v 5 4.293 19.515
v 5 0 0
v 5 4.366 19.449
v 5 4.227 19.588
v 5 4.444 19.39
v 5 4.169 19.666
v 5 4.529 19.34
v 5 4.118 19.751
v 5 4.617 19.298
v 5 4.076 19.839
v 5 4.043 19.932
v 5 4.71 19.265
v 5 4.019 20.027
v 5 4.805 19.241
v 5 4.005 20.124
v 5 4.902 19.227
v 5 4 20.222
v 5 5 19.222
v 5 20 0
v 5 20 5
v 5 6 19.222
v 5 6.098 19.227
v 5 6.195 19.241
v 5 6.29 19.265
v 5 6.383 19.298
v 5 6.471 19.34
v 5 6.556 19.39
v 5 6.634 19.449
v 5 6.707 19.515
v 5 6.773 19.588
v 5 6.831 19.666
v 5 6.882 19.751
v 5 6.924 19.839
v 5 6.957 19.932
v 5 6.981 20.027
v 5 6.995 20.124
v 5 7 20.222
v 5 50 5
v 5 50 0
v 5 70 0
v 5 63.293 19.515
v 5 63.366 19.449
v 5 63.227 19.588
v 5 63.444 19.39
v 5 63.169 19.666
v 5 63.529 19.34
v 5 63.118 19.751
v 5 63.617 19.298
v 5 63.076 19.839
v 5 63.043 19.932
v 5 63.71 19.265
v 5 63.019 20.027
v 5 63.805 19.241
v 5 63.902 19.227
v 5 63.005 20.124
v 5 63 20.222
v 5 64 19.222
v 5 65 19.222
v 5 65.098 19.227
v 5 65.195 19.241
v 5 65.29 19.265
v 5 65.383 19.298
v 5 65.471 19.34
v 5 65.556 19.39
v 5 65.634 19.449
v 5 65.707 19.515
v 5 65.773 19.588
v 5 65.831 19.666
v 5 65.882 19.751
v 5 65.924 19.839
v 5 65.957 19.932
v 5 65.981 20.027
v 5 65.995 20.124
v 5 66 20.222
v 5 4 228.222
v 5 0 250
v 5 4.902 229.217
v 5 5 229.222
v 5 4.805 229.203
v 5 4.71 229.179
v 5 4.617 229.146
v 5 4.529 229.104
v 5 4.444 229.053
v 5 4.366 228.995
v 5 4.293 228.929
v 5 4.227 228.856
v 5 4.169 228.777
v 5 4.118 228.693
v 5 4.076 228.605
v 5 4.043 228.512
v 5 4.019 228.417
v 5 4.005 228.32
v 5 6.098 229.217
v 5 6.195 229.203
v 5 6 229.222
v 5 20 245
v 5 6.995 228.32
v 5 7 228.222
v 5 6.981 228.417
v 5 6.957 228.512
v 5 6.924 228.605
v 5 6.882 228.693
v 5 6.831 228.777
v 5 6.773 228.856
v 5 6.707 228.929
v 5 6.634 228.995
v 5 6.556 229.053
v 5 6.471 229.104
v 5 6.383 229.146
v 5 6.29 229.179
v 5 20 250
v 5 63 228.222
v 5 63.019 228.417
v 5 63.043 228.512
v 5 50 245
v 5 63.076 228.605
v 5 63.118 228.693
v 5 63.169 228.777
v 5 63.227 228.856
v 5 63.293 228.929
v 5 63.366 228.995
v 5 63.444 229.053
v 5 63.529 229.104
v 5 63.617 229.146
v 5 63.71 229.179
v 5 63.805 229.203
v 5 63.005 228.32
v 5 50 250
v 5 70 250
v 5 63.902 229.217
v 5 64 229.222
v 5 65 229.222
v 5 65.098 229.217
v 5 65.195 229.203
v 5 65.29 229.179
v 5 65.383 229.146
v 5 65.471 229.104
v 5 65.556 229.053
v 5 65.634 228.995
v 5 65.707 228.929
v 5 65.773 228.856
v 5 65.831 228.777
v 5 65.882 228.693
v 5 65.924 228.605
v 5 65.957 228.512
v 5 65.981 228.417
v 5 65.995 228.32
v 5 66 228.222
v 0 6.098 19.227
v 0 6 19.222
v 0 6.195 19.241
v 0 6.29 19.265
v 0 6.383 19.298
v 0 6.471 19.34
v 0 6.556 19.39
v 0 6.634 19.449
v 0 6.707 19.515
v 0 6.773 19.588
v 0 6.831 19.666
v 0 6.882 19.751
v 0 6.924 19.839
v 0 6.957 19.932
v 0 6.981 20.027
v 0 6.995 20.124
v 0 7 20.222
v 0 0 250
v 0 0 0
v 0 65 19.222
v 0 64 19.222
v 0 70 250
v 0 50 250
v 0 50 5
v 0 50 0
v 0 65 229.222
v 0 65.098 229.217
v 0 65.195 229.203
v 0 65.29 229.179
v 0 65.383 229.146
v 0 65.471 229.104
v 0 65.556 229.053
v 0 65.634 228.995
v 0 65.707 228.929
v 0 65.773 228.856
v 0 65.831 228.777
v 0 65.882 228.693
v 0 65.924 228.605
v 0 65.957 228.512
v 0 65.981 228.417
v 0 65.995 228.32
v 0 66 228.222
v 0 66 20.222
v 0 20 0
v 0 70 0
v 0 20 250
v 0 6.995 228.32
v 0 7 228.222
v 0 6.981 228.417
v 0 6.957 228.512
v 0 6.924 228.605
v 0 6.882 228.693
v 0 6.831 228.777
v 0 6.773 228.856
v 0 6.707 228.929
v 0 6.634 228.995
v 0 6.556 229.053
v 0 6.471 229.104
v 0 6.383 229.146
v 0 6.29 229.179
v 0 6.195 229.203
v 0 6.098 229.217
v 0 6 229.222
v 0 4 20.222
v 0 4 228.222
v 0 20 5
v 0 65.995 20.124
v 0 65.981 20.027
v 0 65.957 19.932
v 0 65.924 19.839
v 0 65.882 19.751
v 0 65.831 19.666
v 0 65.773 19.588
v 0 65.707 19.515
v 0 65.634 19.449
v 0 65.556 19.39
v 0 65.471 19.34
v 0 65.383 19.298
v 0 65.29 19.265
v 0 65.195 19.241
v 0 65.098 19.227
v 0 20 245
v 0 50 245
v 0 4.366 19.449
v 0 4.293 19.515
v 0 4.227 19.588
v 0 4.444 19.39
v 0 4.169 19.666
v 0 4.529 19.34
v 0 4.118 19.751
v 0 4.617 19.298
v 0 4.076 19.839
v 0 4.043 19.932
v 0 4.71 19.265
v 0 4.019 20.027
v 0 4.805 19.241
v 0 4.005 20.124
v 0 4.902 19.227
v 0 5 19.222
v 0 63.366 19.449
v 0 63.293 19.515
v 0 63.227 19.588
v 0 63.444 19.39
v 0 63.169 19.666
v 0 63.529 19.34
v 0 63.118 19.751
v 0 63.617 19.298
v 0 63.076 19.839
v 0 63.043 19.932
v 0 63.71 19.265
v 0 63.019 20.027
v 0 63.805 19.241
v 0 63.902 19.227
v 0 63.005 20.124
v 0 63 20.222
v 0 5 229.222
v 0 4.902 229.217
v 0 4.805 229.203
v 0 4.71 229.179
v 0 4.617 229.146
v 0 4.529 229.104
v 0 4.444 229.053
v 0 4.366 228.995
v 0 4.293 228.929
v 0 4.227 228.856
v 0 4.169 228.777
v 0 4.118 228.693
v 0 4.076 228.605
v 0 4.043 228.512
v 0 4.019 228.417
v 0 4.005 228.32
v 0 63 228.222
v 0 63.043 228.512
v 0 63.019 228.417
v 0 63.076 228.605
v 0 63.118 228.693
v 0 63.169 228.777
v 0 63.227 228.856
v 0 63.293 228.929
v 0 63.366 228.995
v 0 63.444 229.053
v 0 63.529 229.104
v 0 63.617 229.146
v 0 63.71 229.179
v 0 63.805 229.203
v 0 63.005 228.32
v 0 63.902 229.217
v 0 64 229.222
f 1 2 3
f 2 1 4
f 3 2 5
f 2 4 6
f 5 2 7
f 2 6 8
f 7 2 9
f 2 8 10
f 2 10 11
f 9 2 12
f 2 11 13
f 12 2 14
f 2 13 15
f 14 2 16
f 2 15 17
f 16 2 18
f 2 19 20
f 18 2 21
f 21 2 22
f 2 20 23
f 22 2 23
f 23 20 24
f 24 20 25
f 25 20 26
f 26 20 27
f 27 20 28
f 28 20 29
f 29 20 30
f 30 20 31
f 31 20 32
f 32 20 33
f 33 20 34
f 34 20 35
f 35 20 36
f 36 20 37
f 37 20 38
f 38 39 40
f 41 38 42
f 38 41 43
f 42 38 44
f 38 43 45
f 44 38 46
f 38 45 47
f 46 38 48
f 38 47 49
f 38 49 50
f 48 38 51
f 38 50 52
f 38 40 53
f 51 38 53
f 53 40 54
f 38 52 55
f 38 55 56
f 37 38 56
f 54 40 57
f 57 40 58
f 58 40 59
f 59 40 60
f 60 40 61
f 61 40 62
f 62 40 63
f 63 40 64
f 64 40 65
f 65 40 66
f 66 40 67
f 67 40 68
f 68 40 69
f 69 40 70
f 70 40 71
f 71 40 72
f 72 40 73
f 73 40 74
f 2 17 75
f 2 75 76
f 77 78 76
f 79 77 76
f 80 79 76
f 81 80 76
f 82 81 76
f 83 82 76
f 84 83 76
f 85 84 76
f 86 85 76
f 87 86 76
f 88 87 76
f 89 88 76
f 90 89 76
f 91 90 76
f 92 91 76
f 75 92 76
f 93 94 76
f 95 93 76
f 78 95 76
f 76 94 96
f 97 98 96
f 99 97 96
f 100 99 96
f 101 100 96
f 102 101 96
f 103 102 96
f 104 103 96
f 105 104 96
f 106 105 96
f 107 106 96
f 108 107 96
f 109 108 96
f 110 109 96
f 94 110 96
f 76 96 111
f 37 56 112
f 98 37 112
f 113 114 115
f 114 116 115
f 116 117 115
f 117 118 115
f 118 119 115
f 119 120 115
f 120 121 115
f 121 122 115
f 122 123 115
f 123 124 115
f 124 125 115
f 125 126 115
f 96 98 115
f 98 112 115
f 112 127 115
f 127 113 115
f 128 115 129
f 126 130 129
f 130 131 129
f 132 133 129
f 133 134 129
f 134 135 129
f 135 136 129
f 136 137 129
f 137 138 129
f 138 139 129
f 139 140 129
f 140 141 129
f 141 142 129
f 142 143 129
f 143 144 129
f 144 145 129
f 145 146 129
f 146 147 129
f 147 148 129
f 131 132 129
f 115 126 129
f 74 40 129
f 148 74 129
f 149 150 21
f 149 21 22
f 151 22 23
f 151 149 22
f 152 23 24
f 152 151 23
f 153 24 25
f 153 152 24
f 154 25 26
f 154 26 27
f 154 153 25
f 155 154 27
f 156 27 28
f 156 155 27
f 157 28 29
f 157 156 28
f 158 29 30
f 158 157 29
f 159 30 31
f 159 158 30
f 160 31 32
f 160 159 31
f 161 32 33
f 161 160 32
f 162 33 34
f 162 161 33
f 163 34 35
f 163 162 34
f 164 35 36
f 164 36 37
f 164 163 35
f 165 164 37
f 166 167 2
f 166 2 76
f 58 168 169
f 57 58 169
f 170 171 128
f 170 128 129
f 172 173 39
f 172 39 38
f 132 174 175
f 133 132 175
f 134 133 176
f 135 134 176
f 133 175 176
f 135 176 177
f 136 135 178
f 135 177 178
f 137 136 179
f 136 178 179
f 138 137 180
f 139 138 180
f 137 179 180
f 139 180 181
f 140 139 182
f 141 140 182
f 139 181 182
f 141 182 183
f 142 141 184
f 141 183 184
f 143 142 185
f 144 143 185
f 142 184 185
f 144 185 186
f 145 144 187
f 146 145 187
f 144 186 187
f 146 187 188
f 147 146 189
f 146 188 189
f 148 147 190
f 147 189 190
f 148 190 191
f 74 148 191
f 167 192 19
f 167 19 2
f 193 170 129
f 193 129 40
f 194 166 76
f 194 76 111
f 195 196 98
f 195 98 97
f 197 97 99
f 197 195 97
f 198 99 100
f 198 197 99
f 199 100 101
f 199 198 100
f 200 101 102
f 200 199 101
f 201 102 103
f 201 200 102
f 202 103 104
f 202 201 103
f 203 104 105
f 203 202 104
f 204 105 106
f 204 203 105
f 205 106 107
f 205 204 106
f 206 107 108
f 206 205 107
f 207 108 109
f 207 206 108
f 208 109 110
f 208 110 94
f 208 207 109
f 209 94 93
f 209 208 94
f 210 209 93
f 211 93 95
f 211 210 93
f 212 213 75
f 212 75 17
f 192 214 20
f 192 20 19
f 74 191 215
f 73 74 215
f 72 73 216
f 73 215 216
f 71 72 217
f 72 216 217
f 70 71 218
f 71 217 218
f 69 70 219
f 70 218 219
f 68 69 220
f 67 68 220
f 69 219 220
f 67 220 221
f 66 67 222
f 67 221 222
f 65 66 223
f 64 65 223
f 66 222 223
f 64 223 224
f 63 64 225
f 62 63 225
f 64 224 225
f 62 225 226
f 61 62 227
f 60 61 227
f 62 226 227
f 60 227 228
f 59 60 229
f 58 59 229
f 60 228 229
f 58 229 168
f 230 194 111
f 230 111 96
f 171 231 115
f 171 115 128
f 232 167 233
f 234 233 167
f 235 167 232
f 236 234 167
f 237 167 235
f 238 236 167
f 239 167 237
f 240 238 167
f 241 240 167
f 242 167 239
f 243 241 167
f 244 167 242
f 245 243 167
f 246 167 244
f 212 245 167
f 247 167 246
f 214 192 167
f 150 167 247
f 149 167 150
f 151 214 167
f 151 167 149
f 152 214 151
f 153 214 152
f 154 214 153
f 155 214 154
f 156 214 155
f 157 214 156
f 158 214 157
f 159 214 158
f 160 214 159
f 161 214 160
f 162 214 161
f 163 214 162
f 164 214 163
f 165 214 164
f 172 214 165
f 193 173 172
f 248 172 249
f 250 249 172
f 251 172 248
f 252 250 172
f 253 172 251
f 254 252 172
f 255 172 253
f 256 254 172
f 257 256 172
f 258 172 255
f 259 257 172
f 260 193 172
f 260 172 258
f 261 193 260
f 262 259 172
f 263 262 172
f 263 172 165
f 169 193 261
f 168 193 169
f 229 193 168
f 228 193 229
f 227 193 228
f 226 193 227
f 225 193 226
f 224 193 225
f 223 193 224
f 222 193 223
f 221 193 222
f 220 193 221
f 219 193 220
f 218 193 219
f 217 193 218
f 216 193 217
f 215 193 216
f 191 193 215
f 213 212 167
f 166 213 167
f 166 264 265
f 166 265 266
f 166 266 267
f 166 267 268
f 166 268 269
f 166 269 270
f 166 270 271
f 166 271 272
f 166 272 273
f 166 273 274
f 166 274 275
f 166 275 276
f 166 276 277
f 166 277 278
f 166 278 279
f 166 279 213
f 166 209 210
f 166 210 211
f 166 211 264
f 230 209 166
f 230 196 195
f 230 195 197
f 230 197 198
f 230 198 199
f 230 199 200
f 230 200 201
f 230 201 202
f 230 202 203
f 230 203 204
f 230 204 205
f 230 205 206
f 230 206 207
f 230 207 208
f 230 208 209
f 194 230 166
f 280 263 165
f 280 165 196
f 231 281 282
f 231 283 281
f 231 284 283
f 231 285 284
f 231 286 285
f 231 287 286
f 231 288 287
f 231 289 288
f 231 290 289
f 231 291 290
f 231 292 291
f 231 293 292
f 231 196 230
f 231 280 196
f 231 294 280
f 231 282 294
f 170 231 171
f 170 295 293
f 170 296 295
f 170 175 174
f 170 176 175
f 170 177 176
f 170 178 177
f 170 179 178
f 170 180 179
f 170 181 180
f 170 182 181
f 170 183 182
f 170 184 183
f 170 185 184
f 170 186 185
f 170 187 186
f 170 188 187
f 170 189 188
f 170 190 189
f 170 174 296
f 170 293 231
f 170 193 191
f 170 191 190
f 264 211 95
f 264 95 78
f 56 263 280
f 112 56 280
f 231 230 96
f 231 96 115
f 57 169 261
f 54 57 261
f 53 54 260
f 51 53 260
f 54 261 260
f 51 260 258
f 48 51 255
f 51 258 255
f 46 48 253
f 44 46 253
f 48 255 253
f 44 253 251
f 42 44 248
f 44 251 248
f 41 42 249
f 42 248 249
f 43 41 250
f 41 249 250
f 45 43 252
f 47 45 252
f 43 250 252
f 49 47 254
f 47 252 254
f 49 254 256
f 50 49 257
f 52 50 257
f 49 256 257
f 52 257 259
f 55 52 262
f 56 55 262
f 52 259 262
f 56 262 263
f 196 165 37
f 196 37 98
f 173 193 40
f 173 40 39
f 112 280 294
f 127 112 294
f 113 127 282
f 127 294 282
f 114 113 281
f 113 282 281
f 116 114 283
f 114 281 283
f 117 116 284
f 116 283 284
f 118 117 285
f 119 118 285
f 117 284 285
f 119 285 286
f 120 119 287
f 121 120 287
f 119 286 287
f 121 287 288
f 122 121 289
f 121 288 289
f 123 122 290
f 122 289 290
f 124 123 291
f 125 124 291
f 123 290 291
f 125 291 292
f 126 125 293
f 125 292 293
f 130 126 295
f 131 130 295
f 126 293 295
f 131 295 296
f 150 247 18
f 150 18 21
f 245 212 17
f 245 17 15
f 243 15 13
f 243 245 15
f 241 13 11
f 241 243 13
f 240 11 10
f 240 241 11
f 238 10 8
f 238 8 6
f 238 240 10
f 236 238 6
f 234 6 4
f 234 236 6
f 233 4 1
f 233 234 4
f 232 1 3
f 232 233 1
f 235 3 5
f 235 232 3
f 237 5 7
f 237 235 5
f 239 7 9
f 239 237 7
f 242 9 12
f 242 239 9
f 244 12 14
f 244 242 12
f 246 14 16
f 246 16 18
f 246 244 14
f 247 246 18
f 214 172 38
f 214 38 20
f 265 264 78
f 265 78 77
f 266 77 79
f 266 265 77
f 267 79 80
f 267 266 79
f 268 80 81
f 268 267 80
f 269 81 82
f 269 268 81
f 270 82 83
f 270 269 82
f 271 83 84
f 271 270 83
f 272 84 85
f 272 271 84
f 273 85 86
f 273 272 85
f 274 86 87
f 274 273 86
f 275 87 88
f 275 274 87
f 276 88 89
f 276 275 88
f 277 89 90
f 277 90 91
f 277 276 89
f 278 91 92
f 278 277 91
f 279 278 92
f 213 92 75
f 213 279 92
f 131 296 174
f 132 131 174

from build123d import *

# Parameters (mm, degrees)
EXTRUDE_1_DEPTH = 5


with BuildPart() as part:
    # 草图1 → 凸台-拉伸1 (new body)
    with BuildSketch(Plane(origin=(0, 0, 0), x_dir=(0, 0, -1), z_dir=(1, 0, 0))):
        Polygon((0, 0), (-250, 0), (-250, 20), (-245, 20), (-245, 50), (-250, 50), (-250, 70), (0, 70), (0, 50), (-5, 50), (-5, 20), (0, 20), align=None)
        with BuildLine():
            Line((-228.2219096, 66), (-20.2219096, 66))
            ThreePointArc((-20.2219096, 66), (-19.514802819, 65.707106781), (-19.2219096, 65))
            Line((-19.2219096, 65), (-19.2219096, 64))
            ThreePointArc((-19.2219096, 64), (-19.514802819, 63.292893219), (-20.2219096, 63))
            Line((-20.2219096, 63), (-228.2219096, 63))
            ThreePointArc((-228.2219096, 63), (-228.929016382, 63.292893219), (-229.2219096, 64))
            Line((-229.2219096, 64), (-229.2219096, 65))
            ThreePointArc((-229.2219096, 65), (-228.929016382, 65.707106781), (-228.2219096, 66))
        make_face(mode=Mode.SUBTRACT)
        with BuildLine():
            Line((-228.2219096, 4), (-20.2219096, 4))
            ThreePointArc((-20.2219096, 4), (-19.514802819, 4.292893219), (-19.2219096, 5))
            Line((-19.2219096, 5), (-19.2219096, 6))
            ThreePointArc((-19.2219096, 6), (-19.514802819, 6.707106781), (-20.2219096, 7))
            Line((-20.2219096, 7), (-228.2219096, 7))
            ThreePointArc((-228.2219096, 7), (-228.929016382, 6.707106781), (-229.2219096, 6))
            Line((-229.2219096, 6), (-229.2219096, 5))
            ThreePointArc((-229.2219096, 5), (-228.929016382, 4.292893219), (-228.2219096, 4))
        make_face(mode=Mode.SUBTRACT)
    extrude(amount=EXTRUDE_1_DEPTH)


solid = part.part
